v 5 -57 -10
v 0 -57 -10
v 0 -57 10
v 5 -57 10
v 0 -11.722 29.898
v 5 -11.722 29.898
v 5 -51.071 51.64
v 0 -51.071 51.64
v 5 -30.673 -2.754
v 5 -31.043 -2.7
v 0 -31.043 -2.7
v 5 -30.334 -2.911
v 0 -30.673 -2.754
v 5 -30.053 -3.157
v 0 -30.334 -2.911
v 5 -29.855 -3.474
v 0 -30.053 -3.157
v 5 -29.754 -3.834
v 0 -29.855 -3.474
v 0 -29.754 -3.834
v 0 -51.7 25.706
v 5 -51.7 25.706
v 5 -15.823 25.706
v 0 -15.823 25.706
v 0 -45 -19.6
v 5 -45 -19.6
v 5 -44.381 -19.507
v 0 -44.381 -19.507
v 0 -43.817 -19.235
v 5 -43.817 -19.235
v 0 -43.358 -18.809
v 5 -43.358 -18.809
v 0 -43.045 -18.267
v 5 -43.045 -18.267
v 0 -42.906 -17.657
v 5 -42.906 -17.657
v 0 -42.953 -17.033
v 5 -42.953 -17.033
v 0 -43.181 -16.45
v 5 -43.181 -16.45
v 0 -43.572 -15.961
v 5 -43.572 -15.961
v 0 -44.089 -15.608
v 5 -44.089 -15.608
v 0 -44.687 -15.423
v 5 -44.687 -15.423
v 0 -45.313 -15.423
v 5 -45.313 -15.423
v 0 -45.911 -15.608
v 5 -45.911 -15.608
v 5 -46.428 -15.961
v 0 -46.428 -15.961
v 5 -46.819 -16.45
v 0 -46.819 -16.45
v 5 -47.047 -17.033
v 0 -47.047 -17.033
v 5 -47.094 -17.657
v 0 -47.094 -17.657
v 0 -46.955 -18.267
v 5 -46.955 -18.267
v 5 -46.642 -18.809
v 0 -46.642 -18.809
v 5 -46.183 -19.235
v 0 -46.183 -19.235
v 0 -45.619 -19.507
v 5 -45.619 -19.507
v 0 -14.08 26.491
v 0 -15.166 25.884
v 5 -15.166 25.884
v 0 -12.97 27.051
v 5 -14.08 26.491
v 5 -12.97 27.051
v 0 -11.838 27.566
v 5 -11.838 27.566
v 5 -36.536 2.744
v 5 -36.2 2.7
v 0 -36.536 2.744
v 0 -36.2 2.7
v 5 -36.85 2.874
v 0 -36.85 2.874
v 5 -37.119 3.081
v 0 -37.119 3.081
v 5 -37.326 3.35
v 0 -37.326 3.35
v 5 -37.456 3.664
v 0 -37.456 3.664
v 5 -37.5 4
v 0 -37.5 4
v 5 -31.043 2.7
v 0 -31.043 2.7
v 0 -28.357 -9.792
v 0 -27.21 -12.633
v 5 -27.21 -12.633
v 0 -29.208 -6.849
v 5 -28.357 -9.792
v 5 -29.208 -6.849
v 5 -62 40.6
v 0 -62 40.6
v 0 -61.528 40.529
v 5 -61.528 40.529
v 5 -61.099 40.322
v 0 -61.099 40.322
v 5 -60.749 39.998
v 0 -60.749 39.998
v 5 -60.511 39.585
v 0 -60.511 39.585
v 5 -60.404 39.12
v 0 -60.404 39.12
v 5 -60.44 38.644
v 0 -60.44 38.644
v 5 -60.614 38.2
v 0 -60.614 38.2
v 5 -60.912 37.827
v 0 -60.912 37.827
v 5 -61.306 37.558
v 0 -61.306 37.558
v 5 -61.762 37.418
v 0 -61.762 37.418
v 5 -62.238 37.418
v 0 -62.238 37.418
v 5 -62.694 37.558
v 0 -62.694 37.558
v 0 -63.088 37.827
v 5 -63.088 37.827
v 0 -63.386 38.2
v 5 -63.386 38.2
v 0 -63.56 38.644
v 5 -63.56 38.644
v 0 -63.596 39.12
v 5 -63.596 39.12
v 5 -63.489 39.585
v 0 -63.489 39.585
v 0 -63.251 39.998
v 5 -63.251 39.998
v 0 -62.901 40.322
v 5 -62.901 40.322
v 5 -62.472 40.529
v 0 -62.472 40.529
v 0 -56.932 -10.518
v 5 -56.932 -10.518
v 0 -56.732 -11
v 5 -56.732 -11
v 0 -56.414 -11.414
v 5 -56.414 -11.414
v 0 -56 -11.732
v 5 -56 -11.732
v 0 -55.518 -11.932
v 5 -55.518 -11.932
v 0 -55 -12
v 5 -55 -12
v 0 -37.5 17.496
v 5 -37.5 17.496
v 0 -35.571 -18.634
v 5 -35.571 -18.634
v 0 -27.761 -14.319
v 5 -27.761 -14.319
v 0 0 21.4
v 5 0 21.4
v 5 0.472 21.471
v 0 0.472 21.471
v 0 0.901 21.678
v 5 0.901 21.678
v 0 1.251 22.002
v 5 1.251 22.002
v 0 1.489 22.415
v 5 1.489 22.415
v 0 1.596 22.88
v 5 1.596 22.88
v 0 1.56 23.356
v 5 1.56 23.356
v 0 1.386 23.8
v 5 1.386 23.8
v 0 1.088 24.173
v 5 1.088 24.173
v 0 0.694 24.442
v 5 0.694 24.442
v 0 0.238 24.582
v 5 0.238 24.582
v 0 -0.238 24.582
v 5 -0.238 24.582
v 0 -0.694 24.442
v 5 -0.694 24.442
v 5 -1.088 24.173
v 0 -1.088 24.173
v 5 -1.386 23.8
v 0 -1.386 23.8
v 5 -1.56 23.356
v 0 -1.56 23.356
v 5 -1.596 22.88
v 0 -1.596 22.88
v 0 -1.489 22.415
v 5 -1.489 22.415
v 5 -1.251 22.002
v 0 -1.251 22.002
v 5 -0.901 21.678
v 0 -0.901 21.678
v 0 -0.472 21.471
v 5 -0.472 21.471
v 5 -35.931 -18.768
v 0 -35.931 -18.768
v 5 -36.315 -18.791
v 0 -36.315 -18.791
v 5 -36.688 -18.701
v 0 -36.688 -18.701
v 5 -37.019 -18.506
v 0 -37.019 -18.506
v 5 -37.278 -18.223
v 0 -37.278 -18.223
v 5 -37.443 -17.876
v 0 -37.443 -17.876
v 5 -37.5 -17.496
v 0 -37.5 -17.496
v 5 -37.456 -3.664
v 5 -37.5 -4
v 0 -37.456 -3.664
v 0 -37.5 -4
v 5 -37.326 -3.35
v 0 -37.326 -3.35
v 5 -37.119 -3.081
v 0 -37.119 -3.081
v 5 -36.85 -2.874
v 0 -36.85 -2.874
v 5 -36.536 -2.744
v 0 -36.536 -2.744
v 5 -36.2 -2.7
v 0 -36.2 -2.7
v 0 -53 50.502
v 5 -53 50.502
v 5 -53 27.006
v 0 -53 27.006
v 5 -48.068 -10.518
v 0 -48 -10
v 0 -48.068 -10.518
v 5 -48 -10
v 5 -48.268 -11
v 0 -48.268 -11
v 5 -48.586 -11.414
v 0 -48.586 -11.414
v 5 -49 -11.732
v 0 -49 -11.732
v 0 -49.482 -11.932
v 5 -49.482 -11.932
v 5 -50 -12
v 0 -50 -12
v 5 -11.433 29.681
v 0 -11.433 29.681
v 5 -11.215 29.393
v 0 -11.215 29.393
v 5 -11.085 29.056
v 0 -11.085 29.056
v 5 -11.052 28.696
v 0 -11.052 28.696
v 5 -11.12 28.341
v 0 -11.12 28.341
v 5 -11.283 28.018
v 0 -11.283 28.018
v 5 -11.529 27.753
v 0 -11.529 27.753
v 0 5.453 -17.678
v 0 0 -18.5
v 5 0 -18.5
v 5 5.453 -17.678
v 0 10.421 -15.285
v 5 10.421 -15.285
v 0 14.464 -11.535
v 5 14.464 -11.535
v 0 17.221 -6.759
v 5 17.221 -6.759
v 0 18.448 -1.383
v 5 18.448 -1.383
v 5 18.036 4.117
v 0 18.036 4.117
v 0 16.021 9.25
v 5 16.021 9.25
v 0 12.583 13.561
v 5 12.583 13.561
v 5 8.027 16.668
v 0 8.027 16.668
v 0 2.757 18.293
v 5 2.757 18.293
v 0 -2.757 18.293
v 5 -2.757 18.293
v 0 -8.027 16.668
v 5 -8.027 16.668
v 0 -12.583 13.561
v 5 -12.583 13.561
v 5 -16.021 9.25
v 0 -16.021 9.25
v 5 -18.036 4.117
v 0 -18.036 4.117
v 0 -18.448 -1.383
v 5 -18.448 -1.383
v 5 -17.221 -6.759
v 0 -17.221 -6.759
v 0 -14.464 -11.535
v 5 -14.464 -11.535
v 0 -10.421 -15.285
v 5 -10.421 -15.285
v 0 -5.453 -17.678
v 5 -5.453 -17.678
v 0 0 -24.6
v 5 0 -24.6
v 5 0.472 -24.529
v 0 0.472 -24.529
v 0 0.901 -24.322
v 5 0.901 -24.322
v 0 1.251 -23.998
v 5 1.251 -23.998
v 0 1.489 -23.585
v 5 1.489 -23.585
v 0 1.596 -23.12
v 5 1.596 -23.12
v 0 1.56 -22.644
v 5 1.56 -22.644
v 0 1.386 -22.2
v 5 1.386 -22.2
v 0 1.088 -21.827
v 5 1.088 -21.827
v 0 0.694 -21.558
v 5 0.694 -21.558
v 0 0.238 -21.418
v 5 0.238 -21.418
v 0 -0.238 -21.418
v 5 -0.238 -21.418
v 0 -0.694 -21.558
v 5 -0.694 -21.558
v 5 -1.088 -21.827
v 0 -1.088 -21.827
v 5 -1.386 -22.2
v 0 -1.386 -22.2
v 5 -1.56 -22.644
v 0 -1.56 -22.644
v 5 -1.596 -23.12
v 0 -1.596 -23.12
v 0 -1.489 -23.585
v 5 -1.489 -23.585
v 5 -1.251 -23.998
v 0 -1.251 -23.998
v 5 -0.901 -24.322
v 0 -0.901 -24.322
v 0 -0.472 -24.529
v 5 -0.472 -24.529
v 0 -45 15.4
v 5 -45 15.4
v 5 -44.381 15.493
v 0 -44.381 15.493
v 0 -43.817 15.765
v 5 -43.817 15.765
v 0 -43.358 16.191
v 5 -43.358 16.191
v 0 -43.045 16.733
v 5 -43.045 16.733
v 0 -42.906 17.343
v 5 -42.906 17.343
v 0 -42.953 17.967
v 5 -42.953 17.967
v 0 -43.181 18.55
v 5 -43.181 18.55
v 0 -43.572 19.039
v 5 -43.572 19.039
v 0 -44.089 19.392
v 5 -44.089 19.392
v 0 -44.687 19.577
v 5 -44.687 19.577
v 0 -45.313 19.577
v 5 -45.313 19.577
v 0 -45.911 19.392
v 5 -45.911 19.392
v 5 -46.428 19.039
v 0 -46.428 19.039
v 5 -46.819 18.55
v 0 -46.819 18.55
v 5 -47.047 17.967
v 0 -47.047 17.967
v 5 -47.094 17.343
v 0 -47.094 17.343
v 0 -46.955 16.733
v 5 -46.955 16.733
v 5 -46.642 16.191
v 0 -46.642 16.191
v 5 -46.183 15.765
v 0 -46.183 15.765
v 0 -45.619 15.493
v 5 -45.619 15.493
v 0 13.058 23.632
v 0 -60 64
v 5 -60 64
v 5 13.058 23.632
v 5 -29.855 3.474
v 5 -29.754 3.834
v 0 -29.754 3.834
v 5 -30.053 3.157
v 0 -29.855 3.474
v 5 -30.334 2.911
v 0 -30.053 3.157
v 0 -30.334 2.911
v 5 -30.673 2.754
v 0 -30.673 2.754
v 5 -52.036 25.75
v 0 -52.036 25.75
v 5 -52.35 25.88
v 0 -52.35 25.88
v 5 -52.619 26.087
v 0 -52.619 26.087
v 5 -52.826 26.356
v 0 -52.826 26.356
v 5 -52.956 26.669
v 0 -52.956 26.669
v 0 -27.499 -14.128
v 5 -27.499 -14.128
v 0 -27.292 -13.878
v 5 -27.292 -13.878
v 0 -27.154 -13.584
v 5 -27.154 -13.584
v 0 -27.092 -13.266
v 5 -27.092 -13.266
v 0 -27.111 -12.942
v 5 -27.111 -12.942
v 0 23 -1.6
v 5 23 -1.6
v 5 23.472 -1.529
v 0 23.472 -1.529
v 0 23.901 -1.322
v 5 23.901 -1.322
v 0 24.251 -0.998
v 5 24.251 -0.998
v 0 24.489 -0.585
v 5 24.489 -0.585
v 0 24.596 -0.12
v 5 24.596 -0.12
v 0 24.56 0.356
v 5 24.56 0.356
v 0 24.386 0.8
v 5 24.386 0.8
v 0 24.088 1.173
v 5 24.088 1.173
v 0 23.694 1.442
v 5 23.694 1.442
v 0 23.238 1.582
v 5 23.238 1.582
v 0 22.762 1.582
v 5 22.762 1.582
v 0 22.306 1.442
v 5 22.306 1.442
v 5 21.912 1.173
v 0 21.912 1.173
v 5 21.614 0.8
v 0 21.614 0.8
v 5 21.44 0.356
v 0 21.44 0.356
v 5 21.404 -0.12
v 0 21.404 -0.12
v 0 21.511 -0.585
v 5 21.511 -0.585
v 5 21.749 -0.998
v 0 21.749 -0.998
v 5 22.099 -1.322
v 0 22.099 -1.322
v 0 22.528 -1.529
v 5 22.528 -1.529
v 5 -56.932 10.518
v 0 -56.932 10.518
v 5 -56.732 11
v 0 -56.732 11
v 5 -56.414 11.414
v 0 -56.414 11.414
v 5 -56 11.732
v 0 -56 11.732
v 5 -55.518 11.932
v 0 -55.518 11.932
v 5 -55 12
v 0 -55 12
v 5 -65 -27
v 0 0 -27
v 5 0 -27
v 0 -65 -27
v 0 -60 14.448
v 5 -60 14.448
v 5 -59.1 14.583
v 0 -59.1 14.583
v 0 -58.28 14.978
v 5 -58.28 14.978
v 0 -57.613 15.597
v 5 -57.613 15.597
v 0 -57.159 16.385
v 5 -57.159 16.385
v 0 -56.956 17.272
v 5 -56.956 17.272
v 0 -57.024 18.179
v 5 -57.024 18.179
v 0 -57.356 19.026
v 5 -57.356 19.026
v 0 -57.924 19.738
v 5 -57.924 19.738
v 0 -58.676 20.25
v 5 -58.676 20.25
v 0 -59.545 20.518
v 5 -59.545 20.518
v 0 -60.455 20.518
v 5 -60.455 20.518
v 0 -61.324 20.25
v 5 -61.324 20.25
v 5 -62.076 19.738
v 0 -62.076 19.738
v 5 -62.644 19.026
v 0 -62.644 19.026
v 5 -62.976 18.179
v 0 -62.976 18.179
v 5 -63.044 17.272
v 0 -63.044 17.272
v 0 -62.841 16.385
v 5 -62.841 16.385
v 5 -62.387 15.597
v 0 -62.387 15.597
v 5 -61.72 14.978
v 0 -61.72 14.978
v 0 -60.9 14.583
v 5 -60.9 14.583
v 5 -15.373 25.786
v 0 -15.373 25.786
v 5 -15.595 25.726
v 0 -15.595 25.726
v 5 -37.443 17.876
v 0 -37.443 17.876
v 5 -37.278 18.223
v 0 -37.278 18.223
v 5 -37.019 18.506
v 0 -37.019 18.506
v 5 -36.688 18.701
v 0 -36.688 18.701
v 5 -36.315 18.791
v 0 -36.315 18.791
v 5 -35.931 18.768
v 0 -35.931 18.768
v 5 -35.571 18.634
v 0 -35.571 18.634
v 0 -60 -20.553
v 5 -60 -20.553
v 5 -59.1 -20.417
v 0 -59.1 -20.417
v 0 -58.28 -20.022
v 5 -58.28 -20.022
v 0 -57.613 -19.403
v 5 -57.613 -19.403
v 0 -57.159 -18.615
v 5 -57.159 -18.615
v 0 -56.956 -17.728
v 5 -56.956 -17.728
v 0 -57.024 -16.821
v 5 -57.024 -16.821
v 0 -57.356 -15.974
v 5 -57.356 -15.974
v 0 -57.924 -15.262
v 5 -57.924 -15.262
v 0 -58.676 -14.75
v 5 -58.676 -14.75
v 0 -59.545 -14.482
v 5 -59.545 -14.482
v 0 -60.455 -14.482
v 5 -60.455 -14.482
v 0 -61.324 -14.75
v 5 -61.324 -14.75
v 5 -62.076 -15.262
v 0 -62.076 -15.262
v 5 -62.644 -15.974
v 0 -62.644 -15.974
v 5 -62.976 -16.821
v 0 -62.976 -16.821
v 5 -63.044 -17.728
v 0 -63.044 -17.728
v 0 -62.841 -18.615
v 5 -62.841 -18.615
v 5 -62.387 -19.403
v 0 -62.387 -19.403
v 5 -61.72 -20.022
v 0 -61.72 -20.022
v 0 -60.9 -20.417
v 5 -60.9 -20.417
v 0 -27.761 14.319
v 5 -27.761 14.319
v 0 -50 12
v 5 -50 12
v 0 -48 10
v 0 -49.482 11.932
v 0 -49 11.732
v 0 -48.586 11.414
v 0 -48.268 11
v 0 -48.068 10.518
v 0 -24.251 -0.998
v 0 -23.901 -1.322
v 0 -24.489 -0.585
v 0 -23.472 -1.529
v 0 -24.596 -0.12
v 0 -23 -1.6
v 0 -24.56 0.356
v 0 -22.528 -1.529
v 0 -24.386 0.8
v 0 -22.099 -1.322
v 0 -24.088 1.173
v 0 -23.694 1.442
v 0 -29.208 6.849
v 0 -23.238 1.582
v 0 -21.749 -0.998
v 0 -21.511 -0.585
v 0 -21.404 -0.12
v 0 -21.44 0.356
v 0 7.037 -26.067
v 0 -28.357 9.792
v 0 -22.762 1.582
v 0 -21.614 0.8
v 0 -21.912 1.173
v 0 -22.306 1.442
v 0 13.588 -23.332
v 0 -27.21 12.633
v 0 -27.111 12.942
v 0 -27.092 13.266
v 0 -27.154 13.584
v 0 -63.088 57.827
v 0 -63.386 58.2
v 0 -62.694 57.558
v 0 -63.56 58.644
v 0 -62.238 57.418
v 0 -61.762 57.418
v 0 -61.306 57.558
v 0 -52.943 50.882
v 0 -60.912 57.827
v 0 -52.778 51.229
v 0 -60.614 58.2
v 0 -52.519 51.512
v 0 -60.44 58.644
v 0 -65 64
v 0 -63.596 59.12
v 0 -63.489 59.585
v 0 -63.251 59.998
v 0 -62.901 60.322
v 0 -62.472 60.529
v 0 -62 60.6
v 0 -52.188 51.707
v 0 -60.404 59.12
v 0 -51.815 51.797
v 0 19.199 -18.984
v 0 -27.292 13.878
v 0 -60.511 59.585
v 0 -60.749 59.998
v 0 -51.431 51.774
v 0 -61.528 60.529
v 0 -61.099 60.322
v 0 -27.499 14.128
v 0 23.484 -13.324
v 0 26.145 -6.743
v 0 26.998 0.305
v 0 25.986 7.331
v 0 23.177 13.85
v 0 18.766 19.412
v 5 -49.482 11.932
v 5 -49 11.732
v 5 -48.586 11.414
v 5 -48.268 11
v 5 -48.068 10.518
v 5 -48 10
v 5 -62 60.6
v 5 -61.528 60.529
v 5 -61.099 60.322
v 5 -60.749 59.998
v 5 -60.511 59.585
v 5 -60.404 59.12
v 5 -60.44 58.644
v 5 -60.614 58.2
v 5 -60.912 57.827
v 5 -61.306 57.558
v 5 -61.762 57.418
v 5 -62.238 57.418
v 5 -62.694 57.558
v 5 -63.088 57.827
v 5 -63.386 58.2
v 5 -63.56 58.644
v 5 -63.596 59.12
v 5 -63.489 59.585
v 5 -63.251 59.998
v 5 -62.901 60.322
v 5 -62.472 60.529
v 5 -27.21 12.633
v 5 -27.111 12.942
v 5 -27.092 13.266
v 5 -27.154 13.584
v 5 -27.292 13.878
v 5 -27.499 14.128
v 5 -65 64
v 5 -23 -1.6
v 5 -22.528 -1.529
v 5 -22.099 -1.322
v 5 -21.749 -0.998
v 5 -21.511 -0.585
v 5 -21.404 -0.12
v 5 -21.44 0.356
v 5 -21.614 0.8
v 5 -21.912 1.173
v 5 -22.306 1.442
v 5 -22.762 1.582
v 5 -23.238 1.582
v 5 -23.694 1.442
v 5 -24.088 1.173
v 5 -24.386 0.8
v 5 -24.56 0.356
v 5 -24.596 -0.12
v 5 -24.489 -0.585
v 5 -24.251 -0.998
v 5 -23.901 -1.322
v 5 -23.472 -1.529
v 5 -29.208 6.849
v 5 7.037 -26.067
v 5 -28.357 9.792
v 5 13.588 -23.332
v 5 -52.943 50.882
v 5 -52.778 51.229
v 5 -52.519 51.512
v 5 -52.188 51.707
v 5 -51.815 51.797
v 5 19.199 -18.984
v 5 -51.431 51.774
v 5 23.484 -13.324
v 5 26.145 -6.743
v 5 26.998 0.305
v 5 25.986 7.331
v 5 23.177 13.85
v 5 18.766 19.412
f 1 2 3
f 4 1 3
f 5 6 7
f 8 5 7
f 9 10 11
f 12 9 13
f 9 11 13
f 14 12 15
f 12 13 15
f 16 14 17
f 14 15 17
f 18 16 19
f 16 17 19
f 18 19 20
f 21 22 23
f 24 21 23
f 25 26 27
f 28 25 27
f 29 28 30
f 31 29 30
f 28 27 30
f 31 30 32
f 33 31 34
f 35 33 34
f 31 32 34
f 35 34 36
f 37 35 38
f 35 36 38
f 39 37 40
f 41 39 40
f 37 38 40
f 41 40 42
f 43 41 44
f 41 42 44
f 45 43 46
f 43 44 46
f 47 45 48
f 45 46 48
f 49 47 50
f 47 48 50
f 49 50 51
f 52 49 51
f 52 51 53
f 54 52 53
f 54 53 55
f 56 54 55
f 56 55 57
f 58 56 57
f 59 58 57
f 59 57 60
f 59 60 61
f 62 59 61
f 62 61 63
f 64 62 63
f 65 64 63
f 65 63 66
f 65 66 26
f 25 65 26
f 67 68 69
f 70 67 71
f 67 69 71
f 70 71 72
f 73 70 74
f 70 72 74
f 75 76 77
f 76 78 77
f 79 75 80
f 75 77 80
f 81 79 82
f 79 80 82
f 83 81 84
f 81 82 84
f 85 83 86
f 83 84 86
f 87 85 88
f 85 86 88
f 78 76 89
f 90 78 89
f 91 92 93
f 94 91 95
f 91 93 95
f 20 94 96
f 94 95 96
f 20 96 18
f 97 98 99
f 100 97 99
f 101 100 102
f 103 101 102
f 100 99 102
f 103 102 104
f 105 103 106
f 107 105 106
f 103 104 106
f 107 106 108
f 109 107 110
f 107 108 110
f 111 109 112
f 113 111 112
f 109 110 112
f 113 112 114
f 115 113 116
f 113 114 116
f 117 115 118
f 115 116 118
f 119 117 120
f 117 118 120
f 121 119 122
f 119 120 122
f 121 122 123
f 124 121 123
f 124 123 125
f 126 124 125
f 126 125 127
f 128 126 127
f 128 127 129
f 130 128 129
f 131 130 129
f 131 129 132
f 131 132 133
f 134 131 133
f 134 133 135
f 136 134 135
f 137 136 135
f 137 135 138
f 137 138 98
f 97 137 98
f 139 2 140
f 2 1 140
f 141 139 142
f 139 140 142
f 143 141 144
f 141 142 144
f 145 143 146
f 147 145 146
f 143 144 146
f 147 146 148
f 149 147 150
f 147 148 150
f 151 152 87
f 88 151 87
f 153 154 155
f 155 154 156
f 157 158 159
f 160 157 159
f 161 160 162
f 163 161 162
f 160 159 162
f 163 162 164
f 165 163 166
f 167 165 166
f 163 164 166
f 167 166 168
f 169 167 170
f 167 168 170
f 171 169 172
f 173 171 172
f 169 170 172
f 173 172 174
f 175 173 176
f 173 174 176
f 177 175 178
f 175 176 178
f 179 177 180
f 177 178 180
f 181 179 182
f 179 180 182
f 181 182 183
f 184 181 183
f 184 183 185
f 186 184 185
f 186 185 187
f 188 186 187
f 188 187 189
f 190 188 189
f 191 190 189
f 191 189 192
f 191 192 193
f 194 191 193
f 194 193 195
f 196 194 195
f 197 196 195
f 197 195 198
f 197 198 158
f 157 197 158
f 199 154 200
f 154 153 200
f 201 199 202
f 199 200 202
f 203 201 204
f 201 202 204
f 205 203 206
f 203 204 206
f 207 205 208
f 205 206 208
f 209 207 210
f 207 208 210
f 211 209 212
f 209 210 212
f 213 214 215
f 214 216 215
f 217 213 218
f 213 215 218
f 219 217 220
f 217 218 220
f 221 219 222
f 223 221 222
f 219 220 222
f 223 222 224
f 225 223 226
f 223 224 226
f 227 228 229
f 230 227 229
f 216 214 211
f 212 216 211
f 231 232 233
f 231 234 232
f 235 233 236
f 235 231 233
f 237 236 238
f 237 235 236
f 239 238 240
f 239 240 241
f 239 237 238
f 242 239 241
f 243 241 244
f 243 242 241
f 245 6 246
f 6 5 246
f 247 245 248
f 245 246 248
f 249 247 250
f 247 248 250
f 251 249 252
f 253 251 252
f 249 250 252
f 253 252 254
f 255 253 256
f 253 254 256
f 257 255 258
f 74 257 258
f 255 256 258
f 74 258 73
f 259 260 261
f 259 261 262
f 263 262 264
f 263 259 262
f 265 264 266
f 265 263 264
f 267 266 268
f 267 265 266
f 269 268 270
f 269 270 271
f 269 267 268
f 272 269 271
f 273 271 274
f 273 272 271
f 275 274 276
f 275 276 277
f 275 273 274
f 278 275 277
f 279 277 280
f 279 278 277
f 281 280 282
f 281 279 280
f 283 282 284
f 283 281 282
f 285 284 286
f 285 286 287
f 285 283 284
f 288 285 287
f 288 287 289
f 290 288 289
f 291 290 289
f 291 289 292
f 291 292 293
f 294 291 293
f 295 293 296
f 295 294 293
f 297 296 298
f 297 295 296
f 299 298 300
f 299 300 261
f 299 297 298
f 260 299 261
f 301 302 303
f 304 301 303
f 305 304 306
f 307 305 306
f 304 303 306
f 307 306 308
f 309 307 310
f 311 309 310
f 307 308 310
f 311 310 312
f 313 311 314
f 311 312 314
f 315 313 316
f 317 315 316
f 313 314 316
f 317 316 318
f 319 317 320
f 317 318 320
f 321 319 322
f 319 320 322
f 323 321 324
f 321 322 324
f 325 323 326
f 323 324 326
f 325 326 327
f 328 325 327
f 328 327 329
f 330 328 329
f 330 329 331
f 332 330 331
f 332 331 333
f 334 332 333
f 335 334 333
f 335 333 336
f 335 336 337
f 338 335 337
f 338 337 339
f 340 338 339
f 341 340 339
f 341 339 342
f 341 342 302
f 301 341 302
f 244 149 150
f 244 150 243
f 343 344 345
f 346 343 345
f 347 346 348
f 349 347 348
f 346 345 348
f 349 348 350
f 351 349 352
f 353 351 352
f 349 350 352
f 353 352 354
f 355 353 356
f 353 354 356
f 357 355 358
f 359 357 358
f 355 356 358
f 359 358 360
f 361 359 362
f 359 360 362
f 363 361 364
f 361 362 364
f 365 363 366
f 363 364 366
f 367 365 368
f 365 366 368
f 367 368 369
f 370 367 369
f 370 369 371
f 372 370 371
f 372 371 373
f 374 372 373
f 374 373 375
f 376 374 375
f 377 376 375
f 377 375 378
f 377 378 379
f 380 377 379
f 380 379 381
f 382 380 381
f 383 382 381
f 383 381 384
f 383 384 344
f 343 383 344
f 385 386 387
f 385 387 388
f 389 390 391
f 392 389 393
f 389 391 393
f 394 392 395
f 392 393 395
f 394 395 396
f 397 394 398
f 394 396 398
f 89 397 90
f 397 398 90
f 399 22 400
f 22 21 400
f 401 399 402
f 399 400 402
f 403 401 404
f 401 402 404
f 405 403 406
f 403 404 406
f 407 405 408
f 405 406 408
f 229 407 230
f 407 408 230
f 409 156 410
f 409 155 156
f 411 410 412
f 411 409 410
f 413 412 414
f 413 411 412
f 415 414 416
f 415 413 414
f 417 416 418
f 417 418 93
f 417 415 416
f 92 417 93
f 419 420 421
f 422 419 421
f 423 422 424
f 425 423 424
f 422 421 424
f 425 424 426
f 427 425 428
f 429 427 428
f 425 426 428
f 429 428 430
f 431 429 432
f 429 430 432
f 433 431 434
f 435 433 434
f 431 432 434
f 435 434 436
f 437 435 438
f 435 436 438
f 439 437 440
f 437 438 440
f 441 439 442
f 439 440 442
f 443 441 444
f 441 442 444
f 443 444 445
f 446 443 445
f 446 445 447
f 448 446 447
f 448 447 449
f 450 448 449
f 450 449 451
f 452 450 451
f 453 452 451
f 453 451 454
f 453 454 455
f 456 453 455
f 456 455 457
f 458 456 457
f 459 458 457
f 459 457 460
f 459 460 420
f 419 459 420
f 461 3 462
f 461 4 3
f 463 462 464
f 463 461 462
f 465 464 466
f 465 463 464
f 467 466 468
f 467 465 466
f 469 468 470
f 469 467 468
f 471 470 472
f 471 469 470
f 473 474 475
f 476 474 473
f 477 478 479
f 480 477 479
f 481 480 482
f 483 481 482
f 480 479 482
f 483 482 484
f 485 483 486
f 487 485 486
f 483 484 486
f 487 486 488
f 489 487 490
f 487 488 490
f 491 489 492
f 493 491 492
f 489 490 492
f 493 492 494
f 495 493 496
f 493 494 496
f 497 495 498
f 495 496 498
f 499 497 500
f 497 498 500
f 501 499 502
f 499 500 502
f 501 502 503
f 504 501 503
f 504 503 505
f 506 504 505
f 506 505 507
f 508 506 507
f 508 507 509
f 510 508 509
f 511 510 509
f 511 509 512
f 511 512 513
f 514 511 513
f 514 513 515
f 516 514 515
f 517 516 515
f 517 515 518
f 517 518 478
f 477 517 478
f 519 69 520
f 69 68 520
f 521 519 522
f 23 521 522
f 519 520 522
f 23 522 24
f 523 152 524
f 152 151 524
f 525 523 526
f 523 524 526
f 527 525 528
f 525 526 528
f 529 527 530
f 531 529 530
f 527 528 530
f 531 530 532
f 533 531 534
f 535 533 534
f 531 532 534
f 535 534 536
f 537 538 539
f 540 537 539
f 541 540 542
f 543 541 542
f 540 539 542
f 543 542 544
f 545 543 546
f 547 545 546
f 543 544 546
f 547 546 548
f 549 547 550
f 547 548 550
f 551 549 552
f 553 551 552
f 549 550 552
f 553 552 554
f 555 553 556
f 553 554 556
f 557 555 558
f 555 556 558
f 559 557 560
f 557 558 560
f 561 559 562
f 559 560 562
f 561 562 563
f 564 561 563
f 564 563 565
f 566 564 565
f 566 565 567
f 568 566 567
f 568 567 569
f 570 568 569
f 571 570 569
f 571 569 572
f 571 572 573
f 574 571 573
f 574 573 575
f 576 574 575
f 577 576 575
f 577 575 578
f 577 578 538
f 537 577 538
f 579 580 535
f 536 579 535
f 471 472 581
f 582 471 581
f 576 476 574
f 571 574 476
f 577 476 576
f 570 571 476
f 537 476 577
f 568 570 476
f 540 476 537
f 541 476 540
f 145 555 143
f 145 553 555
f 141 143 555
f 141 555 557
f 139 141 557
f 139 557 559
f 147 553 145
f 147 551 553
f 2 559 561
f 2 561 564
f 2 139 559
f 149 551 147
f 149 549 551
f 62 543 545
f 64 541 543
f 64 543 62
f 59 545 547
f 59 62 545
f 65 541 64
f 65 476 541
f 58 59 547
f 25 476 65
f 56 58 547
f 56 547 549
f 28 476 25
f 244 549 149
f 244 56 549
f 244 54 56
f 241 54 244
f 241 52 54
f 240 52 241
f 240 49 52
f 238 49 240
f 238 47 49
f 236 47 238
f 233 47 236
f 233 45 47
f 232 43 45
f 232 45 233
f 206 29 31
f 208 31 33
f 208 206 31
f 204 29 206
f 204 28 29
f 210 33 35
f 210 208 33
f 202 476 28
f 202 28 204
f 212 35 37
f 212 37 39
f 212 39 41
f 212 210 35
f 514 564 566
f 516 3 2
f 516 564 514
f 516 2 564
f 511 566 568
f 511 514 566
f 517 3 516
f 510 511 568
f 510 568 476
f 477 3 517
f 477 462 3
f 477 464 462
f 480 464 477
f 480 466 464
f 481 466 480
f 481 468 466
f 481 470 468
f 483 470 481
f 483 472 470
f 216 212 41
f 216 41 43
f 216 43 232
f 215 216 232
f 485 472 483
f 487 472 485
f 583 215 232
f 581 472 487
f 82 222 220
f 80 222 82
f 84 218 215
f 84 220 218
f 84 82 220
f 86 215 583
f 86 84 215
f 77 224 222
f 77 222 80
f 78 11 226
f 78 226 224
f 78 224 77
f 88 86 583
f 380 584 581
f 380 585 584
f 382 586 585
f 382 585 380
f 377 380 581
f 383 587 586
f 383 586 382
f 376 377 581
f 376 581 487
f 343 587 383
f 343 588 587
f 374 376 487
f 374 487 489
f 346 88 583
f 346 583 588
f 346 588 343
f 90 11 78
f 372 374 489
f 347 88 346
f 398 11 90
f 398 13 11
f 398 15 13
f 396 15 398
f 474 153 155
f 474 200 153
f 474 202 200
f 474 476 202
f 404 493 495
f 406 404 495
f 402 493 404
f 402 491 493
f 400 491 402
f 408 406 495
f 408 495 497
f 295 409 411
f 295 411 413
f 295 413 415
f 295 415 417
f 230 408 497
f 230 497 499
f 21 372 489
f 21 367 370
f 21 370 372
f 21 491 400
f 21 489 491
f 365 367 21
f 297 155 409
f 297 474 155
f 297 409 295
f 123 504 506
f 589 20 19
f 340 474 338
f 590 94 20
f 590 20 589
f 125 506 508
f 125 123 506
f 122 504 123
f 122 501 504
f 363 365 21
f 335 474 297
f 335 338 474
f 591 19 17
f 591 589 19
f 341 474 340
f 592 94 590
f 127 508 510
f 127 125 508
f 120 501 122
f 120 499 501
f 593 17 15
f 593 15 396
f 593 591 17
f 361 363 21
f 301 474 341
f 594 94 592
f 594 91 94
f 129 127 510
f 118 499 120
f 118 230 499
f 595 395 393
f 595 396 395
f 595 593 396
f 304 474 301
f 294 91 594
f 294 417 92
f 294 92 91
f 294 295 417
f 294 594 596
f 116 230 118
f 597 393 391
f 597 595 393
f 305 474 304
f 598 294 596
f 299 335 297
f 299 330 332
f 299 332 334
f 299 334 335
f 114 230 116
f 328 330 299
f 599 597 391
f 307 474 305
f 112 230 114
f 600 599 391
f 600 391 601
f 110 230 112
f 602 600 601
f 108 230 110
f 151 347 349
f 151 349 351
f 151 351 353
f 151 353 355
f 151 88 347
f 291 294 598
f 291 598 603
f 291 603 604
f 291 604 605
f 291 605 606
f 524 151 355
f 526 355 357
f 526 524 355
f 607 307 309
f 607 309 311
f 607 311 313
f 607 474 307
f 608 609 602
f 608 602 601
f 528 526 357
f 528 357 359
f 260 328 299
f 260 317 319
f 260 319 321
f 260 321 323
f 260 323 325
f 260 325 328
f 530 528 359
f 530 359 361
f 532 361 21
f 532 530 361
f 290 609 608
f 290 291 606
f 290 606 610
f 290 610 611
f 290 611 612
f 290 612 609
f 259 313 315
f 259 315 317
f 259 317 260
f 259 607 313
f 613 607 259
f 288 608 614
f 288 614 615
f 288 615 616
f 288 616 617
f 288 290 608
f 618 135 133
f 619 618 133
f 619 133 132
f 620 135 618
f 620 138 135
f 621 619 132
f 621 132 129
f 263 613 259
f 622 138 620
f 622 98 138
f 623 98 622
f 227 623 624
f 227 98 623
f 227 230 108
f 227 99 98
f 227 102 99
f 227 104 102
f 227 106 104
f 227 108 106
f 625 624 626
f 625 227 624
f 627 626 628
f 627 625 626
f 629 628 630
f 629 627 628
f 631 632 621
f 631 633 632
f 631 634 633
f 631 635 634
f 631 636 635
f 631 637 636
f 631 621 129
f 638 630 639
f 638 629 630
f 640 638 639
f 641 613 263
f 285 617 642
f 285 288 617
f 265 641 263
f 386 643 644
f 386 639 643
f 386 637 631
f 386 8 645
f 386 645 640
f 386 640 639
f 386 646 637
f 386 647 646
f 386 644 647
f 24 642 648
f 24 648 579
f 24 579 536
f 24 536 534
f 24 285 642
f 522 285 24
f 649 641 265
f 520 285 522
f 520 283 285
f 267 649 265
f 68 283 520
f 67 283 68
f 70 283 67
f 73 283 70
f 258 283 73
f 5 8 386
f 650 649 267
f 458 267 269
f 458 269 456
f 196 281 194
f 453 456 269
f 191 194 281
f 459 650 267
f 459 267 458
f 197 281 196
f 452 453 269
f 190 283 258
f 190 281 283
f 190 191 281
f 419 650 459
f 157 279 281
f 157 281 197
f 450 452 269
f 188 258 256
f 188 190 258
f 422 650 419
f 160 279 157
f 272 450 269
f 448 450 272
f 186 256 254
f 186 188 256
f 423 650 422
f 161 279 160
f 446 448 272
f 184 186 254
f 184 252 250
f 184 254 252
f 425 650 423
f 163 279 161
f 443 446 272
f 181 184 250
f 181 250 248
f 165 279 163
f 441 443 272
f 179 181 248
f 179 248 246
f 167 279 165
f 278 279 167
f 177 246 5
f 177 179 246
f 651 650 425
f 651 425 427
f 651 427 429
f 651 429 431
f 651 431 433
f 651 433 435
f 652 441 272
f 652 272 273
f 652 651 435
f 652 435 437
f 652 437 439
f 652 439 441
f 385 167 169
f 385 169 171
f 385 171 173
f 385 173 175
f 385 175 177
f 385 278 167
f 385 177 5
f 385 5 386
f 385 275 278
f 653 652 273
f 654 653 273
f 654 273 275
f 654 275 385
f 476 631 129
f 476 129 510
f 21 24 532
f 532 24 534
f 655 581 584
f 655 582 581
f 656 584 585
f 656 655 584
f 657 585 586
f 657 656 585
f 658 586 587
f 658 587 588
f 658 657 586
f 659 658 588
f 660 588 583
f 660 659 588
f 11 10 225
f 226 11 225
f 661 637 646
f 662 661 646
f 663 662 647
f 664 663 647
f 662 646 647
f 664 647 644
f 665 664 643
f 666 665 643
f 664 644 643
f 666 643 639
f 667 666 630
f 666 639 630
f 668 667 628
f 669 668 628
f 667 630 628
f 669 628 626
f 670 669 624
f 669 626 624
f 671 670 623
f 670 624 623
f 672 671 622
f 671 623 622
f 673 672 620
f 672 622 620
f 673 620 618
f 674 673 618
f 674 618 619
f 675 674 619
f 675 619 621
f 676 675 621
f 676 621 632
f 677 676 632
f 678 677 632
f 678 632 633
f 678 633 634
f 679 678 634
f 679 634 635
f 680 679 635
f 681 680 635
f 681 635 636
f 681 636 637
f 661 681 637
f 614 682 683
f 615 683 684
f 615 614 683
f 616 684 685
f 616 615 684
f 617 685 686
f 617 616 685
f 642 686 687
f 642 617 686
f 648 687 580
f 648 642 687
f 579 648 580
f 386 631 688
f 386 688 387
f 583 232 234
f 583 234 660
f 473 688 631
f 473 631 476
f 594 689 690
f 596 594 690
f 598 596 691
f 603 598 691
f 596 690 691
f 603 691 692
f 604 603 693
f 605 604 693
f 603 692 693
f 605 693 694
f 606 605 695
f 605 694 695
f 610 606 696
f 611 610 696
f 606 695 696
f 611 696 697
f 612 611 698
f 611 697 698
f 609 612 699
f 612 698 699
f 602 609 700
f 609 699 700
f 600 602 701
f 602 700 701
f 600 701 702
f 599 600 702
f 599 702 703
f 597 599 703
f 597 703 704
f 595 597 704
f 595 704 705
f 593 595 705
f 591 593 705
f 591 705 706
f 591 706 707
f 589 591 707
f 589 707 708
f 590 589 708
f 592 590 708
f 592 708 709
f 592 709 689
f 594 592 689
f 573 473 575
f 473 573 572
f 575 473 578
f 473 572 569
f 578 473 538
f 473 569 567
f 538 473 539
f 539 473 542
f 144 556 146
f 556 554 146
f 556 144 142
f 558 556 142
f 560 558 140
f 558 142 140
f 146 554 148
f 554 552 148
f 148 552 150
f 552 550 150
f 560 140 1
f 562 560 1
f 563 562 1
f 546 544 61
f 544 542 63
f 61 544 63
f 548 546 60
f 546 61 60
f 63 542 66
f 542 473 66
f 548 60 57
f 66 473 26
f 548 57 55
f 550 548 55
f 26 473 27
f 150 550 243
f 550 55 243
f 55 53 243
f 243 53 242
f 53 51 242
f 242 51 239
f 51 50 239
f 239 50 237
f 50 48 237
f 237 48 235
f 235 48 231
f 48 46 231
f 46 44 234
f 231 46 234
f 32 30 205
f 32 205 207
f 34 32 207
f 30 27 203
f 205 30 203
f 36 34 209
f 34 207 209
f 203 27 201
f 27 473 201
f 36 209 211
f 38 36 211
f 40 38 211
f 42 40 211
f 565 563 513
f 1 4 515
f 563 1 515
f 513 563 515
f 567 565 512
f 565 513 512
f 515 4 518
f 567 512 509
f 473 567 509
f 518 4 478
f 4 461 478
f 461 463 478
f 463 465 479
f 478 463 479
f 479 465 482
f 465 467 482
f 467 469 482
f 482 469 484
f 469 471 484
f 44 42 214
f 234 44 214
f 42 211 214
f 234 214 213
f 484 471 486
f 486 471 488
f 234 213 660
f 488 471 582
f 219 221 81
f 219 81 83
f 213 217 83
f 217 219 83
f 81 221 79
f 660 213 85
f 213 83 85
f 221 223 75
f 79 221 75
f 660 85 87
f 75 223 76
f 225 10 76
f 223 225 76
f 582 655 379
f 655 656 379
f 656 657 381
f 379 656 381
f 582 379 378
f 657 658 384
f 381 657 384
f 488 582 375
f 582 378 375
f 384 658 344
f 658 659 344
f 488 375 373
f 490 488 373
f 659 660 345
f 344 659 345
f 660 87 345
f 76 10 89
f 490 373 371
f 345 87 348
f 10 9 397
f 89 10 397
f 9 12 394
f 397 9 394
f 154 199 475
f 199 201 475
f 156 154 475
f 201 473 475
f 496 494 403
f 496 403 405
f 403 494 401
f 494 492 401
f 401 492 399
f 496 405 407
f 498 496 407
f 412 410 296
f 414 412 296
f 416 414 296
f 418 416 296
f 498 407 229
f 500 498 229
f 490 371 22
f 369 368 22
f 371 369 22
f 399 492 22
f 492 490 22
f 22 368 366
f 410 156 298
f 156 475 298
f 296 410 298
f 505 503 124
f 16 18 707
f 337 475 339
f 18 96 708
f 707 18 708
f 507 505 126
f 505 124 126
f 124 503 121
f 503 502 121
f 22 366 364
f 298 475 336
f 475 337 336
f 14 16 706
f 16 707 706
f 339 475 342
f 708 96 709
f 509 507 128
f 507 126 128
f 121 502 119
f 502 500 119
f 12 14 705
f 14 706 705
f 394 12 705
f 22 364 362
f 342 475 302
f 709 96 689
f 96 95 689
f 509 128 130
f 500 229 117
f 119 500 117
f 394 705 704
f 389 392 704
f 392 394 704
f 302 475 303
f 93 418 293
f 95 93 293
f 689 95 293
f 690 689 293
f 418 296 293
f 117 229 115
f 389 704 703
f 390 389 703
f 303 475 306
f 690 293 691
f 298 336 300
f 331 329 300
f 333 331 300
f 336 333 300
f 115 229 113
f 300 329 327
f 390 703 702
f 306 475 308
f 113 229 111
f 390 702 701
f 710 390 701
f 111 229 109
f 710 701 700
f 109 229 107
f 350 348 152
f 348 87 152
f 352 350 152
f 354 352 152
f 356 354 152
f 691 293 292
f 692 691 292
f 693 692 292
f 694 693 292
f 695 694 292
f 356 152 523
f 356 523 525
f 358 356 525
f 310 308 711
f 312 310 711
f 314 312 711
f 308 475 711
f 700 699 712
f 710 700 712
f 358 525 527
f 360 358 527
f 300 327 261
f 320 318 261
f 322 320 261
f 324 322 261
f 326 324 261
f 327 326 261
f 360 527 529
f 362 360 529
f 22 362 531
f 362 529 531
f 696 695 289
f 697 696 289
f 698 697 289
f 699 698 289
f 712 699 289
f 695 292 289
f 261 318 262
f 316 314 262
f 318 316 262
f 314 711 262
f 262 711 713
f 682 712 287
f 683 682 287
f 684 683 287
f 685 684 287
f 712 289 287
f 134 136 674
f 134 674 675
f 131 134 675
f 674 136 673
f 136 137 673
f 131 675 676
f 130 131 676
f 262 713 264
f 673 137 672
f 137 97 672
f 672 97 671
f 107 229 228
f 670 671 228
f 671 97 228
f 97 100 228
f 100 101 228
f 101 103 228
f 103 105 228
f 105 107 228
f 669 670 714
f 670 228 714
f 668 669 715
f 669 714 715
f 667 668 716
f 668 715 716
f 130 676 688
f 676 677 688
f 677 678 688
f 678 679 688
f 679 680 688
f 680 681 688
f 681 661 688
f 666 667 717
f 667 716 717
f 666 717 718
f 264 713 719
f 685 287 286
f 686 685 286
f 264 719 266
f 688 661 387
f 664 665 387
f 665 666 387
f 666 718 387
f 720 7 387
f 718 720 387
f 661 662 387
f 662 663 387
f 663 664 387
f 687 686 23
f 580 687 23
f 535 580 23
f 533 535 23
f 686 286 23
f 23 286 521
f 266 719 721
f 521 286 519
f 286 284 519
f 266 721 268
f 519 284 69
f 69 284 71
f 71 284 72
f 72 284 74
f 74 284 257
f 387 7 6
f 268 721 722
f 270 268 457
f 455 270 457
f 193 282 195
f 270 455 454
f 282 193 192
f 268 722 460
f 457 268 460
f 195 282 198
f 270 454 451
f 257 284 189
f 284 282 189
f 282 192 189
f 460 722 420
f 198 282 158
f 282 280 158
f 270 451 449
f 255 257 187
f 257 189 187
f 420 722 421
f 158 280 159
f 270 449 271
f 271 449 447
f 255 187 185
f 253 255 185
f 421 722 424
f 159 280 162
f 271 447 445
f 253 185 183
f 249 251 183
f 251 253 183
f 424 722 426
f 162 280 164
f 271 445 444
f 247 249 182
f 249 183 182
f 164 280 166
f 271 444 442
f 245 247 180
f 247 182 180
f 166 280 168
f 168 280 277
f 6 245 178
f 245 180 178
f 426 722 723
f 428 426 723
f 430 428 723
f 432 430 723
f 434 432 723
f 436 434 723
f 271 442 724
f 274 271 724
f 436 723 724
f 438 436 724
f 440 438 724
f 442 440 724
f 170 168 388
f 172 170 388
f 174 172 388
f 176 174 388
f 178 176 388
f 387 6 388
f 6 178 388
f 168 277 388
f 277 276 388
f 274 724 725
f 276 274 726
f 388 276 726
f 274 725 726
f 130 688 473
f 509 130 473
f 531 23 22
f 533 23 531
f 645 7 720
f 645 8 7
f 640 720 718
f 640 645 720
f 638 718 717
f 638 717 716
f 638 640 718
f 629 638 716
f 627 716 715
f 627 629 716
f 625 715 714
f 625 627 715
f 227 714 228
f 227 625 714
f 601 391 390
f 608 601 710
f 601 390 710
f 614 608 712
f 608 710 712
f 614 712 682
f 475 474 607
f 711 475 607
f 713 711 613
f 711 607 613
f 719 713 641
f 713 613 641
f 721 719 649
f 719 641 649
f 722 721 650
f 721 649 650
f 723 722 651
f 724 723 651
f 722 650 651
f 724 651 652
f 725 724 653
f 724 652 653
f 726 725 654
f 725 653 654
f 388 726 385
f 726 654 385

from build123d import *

# Parameters (mm, degrees)
SKETCH_1_R           = 27
SKETCH_1_R_2         = 18.5
EXTRUDE_1_DEPTH      = 5
SKETCH_2_R           = 1.6
CUT_EXTRUDE_1_DEPTH  = 10
EXTRUDE_2_DEPTH      = 5
SKETCH_9_W           = 91
SKETCH_9_H           = 135
CUT_EXTRUDE_5_DEPTH  = 211.049994049
SKETCH_13_R          = 2.1
SKETCH_13_R_2        = 3.0525
CUT_EXTRUDE_6_DEPTH  = 92.356444764
SKETCH_14_R          = 1.6
CUT_EXTRUDE_7_DEPTH  = 92.356444764
SKETCH_15_W          = 24
SKETCH_15_H          = 9
CUT_EXTRUDE_8_DEPTH  = 10
FILLET_1_R           = 2
CUT_EXTRUDE_9_DEPTH  = 92.356444764
FILLET_2_R           = 1.3
CUT_EXTRUDE_10_DEPTH = 92.356444764
FILLET_3_R           = 1.3


with BuildPart() as part:
    # 草图1 → 凸台-拉伸1 (new body)
    with BuildSketch(Plane(origin=(0, 0, 0), x_dir=(0, 0, -1), z_dir=(1, 0, 0))):
        Circle(SKETCH_1_R)
        Circle(SKETCH_1_R_2, mode=Mode.SUBTRACT)
    extrude(amount=EXTRUDE_1_DEPTH)

    # 草图2 → 切除-拉伸1 (cut)
    with BuildSketch(Plane(origin=(5, 0, 0), x_dir=(0, 0, -1), z_dir=(1, 0, 0))):
        with Locations((23, 0)):
            Circle(SKETCH_2_R)
        with Locations((0, -23)):
            Circle(SKETCH_2_R)
        with Locations((0, 23)):
            Circle(SKETCH_2_R)
        with Locations((-23, 0)):
            Circle(SKETCH_2_R)
    extrude(amount=-CUT_EXTRUDE_1_DEPTH, mode=Mode.SUBTRACT)

    # 草图3 → 凸台-拉伸2 (add)
    with BuildSketch(Plane.ZY):
        with BuildLine():
            ThreePointArc((27, 0), (0, -27), (-27, 0))
            Line((-27, 0), (-27, -200))
            Line((-27, -200), (64, -200))
            Line((64, -200), (64, -60))
            Line((64, -60), (23.632414536, 13.057908838))
            ThreePointArc((23.632414536, 13.057908838), (26.144551942, 6.742581388), (27, 0))
        make_face()
    extrude(amount=-EXTRUDE_2_DEPTH)

    # 草图9 → 切除-拉伸5 (cut, through all)
    with BuildSketch(Plane(origin=(5, 0, 0), x_dir=(0, 0, -1), z_dir=(1, 0, 0))):
        with Locations((-18.5, -132.5)):
            Rectangle(SKETCH_9_W, SKETCH_9_H)
    extrude(amount=-CUT_EXTRUDE_5_DEPTH, mode=Mode.SUBTRACT)

    # 草图13 → 切除-拉伸6 (cut, through all)
    with BuildSketch(Plane(origin=(5, 0, 0), x_dir=(0, 0, -1), z_dir=(1, 0, 0))):
        with Locations((-17.5, -45)):
            Circle(SKETCH_13_R)
        with Locations((-17.5, -60)):
            Circle(SKETCH_13_R_2)
        with Locations((17.5, -60)):
            Circle(SKETCH_13_R_2)
        with Locations((17.5, -45)):
            Circle(SKETCH_13_R)
    extrude(amount=-CUT_EXTRUDE_6_DEPTH, mode=Mode.SUBTRACT)

    # 草图14 → 切除-拉伸7 (cut, through all)
    with BuildSketch(Plane.ZY):
        with Locations((39, -62)):
            Circle(SKETCH_14_R)
        with Locations((59, -62)):
            Circle(SKETCH_14_R)
    extrude(amount=-CUT_EXTRUDE_7_DEPTH, mode=Mode.SUBTRACT)

    # 草图15 → 切除-拉伸8 (cut)
    with BuildSketch(Plane.ZY):
        with Locations((0, -52.5)):
            Rectangle(SKETCH_15_W, SKETCH_15_H)
    extrude(amount=-CUT_EXTRUDE_8_DEPTH, mode=Mode.SUBTRACT)

    # 圆角1
    fillet_1_edges = [part.edges().sort_by_distance(p)[0] for p in [
        (2.5, -57, -12),
        (2.5, -48, -12),
        (2.5, -48, 12),
        (2.5, -57, 12),
    ]]
    fillet(fillet_1_edges, radius=FILLET_1_R)

    # 草图16 → 切除-拉伸9 (cut, through all)
    with BuildSketch(Plane(origin=(5, 0, 0), x_dir=(0, 0, -1), z_dir=(1, 0, 0))):
        with BuildLine():
            Line((-28.536090226, -9.256973298), (-52.705963097, -53))
            Line((-52.705963097, -53), (-25.705963097, -53))
            Line((-25.705963097, -53), (-25.705963097, -15.466203841))
            ThreePointArc((-25.705963097, -15.466203841), (-27.29814505, -12.442317985), (-28.536090226, -9.256973298))
        make_face()
    extrude(amount=-CUT_EXTRUDE_9_DEPTH, mode=Mode.SUBTRACT)

    # 圆角2
    fillet_2_edges = [part.edges().sort_by_distance(p)[0] for p in [
        (2.5, -9.256973298, 28.536090226),
        (2.5, -15.466203841, 25.705963097),
        (2.5, -53, 25.705963097),
        (2.5, -53, 52.705963097),
    ]]
    fillet(fillet_2_edges, radius=FILLET_2_R)

    # 草图17 → 切除-拉伸10 (cut, through all)
    with BuildSketch(Plane(origin=(5, 0, 0), x_dir=(0, 0, -1), z_dir=(1, 0, 0))):
        with BuildLine():
            ThreePointArc((-2.7, -29.878252961), (-8.364759165, -28.81025519), (-13.720671758, -26.678515073))
            Line((-13.720671758, -26.678515073), (-19.7, -37.5))
            Line((-19.7, -37.5), (-2.7, -37.5))
            Line((-2.7, -37.5), (-2.7, -29.878252961))
        make_face()
        with BuildLine():
            Line((19.7, -37.5), (13.720671758, -26.678515073))
            ThreePointArc((13.720671758, -26.678515073), (8.364759165, -28.81025519), (2.7, -29.878252961))
            Line((2.7, -29.878252961), (2.7, -37.5))
            Line((2.7, -37.5), (19.7, -37.5))
        make_face()
    extrude(amount=-CUT_EXTRUDE_10_DEPTH, mode=Mode.SUBTRACT)

    # 圆角3
    fillet_3_edges = [part.edges().sort_by_distance(p)[0] for p in [
        (2.5, -26.678515073, 13.720671758),
        (2.5, -29.878252961, 2.7),
        (2.5, -37.5, 2.7),
        (2.5, -37.5, 19.7),
        (2.5, -29.878252961, -2.7),
        (2.5, -26.678515073, -13.720671758),
        (2.5, -37.5, -19.7),
        (2.5, -37.5, -2.7),
    ]]
    fillet(fillet_3_edges, radius=FILLET_3_R)


solid = part.part
